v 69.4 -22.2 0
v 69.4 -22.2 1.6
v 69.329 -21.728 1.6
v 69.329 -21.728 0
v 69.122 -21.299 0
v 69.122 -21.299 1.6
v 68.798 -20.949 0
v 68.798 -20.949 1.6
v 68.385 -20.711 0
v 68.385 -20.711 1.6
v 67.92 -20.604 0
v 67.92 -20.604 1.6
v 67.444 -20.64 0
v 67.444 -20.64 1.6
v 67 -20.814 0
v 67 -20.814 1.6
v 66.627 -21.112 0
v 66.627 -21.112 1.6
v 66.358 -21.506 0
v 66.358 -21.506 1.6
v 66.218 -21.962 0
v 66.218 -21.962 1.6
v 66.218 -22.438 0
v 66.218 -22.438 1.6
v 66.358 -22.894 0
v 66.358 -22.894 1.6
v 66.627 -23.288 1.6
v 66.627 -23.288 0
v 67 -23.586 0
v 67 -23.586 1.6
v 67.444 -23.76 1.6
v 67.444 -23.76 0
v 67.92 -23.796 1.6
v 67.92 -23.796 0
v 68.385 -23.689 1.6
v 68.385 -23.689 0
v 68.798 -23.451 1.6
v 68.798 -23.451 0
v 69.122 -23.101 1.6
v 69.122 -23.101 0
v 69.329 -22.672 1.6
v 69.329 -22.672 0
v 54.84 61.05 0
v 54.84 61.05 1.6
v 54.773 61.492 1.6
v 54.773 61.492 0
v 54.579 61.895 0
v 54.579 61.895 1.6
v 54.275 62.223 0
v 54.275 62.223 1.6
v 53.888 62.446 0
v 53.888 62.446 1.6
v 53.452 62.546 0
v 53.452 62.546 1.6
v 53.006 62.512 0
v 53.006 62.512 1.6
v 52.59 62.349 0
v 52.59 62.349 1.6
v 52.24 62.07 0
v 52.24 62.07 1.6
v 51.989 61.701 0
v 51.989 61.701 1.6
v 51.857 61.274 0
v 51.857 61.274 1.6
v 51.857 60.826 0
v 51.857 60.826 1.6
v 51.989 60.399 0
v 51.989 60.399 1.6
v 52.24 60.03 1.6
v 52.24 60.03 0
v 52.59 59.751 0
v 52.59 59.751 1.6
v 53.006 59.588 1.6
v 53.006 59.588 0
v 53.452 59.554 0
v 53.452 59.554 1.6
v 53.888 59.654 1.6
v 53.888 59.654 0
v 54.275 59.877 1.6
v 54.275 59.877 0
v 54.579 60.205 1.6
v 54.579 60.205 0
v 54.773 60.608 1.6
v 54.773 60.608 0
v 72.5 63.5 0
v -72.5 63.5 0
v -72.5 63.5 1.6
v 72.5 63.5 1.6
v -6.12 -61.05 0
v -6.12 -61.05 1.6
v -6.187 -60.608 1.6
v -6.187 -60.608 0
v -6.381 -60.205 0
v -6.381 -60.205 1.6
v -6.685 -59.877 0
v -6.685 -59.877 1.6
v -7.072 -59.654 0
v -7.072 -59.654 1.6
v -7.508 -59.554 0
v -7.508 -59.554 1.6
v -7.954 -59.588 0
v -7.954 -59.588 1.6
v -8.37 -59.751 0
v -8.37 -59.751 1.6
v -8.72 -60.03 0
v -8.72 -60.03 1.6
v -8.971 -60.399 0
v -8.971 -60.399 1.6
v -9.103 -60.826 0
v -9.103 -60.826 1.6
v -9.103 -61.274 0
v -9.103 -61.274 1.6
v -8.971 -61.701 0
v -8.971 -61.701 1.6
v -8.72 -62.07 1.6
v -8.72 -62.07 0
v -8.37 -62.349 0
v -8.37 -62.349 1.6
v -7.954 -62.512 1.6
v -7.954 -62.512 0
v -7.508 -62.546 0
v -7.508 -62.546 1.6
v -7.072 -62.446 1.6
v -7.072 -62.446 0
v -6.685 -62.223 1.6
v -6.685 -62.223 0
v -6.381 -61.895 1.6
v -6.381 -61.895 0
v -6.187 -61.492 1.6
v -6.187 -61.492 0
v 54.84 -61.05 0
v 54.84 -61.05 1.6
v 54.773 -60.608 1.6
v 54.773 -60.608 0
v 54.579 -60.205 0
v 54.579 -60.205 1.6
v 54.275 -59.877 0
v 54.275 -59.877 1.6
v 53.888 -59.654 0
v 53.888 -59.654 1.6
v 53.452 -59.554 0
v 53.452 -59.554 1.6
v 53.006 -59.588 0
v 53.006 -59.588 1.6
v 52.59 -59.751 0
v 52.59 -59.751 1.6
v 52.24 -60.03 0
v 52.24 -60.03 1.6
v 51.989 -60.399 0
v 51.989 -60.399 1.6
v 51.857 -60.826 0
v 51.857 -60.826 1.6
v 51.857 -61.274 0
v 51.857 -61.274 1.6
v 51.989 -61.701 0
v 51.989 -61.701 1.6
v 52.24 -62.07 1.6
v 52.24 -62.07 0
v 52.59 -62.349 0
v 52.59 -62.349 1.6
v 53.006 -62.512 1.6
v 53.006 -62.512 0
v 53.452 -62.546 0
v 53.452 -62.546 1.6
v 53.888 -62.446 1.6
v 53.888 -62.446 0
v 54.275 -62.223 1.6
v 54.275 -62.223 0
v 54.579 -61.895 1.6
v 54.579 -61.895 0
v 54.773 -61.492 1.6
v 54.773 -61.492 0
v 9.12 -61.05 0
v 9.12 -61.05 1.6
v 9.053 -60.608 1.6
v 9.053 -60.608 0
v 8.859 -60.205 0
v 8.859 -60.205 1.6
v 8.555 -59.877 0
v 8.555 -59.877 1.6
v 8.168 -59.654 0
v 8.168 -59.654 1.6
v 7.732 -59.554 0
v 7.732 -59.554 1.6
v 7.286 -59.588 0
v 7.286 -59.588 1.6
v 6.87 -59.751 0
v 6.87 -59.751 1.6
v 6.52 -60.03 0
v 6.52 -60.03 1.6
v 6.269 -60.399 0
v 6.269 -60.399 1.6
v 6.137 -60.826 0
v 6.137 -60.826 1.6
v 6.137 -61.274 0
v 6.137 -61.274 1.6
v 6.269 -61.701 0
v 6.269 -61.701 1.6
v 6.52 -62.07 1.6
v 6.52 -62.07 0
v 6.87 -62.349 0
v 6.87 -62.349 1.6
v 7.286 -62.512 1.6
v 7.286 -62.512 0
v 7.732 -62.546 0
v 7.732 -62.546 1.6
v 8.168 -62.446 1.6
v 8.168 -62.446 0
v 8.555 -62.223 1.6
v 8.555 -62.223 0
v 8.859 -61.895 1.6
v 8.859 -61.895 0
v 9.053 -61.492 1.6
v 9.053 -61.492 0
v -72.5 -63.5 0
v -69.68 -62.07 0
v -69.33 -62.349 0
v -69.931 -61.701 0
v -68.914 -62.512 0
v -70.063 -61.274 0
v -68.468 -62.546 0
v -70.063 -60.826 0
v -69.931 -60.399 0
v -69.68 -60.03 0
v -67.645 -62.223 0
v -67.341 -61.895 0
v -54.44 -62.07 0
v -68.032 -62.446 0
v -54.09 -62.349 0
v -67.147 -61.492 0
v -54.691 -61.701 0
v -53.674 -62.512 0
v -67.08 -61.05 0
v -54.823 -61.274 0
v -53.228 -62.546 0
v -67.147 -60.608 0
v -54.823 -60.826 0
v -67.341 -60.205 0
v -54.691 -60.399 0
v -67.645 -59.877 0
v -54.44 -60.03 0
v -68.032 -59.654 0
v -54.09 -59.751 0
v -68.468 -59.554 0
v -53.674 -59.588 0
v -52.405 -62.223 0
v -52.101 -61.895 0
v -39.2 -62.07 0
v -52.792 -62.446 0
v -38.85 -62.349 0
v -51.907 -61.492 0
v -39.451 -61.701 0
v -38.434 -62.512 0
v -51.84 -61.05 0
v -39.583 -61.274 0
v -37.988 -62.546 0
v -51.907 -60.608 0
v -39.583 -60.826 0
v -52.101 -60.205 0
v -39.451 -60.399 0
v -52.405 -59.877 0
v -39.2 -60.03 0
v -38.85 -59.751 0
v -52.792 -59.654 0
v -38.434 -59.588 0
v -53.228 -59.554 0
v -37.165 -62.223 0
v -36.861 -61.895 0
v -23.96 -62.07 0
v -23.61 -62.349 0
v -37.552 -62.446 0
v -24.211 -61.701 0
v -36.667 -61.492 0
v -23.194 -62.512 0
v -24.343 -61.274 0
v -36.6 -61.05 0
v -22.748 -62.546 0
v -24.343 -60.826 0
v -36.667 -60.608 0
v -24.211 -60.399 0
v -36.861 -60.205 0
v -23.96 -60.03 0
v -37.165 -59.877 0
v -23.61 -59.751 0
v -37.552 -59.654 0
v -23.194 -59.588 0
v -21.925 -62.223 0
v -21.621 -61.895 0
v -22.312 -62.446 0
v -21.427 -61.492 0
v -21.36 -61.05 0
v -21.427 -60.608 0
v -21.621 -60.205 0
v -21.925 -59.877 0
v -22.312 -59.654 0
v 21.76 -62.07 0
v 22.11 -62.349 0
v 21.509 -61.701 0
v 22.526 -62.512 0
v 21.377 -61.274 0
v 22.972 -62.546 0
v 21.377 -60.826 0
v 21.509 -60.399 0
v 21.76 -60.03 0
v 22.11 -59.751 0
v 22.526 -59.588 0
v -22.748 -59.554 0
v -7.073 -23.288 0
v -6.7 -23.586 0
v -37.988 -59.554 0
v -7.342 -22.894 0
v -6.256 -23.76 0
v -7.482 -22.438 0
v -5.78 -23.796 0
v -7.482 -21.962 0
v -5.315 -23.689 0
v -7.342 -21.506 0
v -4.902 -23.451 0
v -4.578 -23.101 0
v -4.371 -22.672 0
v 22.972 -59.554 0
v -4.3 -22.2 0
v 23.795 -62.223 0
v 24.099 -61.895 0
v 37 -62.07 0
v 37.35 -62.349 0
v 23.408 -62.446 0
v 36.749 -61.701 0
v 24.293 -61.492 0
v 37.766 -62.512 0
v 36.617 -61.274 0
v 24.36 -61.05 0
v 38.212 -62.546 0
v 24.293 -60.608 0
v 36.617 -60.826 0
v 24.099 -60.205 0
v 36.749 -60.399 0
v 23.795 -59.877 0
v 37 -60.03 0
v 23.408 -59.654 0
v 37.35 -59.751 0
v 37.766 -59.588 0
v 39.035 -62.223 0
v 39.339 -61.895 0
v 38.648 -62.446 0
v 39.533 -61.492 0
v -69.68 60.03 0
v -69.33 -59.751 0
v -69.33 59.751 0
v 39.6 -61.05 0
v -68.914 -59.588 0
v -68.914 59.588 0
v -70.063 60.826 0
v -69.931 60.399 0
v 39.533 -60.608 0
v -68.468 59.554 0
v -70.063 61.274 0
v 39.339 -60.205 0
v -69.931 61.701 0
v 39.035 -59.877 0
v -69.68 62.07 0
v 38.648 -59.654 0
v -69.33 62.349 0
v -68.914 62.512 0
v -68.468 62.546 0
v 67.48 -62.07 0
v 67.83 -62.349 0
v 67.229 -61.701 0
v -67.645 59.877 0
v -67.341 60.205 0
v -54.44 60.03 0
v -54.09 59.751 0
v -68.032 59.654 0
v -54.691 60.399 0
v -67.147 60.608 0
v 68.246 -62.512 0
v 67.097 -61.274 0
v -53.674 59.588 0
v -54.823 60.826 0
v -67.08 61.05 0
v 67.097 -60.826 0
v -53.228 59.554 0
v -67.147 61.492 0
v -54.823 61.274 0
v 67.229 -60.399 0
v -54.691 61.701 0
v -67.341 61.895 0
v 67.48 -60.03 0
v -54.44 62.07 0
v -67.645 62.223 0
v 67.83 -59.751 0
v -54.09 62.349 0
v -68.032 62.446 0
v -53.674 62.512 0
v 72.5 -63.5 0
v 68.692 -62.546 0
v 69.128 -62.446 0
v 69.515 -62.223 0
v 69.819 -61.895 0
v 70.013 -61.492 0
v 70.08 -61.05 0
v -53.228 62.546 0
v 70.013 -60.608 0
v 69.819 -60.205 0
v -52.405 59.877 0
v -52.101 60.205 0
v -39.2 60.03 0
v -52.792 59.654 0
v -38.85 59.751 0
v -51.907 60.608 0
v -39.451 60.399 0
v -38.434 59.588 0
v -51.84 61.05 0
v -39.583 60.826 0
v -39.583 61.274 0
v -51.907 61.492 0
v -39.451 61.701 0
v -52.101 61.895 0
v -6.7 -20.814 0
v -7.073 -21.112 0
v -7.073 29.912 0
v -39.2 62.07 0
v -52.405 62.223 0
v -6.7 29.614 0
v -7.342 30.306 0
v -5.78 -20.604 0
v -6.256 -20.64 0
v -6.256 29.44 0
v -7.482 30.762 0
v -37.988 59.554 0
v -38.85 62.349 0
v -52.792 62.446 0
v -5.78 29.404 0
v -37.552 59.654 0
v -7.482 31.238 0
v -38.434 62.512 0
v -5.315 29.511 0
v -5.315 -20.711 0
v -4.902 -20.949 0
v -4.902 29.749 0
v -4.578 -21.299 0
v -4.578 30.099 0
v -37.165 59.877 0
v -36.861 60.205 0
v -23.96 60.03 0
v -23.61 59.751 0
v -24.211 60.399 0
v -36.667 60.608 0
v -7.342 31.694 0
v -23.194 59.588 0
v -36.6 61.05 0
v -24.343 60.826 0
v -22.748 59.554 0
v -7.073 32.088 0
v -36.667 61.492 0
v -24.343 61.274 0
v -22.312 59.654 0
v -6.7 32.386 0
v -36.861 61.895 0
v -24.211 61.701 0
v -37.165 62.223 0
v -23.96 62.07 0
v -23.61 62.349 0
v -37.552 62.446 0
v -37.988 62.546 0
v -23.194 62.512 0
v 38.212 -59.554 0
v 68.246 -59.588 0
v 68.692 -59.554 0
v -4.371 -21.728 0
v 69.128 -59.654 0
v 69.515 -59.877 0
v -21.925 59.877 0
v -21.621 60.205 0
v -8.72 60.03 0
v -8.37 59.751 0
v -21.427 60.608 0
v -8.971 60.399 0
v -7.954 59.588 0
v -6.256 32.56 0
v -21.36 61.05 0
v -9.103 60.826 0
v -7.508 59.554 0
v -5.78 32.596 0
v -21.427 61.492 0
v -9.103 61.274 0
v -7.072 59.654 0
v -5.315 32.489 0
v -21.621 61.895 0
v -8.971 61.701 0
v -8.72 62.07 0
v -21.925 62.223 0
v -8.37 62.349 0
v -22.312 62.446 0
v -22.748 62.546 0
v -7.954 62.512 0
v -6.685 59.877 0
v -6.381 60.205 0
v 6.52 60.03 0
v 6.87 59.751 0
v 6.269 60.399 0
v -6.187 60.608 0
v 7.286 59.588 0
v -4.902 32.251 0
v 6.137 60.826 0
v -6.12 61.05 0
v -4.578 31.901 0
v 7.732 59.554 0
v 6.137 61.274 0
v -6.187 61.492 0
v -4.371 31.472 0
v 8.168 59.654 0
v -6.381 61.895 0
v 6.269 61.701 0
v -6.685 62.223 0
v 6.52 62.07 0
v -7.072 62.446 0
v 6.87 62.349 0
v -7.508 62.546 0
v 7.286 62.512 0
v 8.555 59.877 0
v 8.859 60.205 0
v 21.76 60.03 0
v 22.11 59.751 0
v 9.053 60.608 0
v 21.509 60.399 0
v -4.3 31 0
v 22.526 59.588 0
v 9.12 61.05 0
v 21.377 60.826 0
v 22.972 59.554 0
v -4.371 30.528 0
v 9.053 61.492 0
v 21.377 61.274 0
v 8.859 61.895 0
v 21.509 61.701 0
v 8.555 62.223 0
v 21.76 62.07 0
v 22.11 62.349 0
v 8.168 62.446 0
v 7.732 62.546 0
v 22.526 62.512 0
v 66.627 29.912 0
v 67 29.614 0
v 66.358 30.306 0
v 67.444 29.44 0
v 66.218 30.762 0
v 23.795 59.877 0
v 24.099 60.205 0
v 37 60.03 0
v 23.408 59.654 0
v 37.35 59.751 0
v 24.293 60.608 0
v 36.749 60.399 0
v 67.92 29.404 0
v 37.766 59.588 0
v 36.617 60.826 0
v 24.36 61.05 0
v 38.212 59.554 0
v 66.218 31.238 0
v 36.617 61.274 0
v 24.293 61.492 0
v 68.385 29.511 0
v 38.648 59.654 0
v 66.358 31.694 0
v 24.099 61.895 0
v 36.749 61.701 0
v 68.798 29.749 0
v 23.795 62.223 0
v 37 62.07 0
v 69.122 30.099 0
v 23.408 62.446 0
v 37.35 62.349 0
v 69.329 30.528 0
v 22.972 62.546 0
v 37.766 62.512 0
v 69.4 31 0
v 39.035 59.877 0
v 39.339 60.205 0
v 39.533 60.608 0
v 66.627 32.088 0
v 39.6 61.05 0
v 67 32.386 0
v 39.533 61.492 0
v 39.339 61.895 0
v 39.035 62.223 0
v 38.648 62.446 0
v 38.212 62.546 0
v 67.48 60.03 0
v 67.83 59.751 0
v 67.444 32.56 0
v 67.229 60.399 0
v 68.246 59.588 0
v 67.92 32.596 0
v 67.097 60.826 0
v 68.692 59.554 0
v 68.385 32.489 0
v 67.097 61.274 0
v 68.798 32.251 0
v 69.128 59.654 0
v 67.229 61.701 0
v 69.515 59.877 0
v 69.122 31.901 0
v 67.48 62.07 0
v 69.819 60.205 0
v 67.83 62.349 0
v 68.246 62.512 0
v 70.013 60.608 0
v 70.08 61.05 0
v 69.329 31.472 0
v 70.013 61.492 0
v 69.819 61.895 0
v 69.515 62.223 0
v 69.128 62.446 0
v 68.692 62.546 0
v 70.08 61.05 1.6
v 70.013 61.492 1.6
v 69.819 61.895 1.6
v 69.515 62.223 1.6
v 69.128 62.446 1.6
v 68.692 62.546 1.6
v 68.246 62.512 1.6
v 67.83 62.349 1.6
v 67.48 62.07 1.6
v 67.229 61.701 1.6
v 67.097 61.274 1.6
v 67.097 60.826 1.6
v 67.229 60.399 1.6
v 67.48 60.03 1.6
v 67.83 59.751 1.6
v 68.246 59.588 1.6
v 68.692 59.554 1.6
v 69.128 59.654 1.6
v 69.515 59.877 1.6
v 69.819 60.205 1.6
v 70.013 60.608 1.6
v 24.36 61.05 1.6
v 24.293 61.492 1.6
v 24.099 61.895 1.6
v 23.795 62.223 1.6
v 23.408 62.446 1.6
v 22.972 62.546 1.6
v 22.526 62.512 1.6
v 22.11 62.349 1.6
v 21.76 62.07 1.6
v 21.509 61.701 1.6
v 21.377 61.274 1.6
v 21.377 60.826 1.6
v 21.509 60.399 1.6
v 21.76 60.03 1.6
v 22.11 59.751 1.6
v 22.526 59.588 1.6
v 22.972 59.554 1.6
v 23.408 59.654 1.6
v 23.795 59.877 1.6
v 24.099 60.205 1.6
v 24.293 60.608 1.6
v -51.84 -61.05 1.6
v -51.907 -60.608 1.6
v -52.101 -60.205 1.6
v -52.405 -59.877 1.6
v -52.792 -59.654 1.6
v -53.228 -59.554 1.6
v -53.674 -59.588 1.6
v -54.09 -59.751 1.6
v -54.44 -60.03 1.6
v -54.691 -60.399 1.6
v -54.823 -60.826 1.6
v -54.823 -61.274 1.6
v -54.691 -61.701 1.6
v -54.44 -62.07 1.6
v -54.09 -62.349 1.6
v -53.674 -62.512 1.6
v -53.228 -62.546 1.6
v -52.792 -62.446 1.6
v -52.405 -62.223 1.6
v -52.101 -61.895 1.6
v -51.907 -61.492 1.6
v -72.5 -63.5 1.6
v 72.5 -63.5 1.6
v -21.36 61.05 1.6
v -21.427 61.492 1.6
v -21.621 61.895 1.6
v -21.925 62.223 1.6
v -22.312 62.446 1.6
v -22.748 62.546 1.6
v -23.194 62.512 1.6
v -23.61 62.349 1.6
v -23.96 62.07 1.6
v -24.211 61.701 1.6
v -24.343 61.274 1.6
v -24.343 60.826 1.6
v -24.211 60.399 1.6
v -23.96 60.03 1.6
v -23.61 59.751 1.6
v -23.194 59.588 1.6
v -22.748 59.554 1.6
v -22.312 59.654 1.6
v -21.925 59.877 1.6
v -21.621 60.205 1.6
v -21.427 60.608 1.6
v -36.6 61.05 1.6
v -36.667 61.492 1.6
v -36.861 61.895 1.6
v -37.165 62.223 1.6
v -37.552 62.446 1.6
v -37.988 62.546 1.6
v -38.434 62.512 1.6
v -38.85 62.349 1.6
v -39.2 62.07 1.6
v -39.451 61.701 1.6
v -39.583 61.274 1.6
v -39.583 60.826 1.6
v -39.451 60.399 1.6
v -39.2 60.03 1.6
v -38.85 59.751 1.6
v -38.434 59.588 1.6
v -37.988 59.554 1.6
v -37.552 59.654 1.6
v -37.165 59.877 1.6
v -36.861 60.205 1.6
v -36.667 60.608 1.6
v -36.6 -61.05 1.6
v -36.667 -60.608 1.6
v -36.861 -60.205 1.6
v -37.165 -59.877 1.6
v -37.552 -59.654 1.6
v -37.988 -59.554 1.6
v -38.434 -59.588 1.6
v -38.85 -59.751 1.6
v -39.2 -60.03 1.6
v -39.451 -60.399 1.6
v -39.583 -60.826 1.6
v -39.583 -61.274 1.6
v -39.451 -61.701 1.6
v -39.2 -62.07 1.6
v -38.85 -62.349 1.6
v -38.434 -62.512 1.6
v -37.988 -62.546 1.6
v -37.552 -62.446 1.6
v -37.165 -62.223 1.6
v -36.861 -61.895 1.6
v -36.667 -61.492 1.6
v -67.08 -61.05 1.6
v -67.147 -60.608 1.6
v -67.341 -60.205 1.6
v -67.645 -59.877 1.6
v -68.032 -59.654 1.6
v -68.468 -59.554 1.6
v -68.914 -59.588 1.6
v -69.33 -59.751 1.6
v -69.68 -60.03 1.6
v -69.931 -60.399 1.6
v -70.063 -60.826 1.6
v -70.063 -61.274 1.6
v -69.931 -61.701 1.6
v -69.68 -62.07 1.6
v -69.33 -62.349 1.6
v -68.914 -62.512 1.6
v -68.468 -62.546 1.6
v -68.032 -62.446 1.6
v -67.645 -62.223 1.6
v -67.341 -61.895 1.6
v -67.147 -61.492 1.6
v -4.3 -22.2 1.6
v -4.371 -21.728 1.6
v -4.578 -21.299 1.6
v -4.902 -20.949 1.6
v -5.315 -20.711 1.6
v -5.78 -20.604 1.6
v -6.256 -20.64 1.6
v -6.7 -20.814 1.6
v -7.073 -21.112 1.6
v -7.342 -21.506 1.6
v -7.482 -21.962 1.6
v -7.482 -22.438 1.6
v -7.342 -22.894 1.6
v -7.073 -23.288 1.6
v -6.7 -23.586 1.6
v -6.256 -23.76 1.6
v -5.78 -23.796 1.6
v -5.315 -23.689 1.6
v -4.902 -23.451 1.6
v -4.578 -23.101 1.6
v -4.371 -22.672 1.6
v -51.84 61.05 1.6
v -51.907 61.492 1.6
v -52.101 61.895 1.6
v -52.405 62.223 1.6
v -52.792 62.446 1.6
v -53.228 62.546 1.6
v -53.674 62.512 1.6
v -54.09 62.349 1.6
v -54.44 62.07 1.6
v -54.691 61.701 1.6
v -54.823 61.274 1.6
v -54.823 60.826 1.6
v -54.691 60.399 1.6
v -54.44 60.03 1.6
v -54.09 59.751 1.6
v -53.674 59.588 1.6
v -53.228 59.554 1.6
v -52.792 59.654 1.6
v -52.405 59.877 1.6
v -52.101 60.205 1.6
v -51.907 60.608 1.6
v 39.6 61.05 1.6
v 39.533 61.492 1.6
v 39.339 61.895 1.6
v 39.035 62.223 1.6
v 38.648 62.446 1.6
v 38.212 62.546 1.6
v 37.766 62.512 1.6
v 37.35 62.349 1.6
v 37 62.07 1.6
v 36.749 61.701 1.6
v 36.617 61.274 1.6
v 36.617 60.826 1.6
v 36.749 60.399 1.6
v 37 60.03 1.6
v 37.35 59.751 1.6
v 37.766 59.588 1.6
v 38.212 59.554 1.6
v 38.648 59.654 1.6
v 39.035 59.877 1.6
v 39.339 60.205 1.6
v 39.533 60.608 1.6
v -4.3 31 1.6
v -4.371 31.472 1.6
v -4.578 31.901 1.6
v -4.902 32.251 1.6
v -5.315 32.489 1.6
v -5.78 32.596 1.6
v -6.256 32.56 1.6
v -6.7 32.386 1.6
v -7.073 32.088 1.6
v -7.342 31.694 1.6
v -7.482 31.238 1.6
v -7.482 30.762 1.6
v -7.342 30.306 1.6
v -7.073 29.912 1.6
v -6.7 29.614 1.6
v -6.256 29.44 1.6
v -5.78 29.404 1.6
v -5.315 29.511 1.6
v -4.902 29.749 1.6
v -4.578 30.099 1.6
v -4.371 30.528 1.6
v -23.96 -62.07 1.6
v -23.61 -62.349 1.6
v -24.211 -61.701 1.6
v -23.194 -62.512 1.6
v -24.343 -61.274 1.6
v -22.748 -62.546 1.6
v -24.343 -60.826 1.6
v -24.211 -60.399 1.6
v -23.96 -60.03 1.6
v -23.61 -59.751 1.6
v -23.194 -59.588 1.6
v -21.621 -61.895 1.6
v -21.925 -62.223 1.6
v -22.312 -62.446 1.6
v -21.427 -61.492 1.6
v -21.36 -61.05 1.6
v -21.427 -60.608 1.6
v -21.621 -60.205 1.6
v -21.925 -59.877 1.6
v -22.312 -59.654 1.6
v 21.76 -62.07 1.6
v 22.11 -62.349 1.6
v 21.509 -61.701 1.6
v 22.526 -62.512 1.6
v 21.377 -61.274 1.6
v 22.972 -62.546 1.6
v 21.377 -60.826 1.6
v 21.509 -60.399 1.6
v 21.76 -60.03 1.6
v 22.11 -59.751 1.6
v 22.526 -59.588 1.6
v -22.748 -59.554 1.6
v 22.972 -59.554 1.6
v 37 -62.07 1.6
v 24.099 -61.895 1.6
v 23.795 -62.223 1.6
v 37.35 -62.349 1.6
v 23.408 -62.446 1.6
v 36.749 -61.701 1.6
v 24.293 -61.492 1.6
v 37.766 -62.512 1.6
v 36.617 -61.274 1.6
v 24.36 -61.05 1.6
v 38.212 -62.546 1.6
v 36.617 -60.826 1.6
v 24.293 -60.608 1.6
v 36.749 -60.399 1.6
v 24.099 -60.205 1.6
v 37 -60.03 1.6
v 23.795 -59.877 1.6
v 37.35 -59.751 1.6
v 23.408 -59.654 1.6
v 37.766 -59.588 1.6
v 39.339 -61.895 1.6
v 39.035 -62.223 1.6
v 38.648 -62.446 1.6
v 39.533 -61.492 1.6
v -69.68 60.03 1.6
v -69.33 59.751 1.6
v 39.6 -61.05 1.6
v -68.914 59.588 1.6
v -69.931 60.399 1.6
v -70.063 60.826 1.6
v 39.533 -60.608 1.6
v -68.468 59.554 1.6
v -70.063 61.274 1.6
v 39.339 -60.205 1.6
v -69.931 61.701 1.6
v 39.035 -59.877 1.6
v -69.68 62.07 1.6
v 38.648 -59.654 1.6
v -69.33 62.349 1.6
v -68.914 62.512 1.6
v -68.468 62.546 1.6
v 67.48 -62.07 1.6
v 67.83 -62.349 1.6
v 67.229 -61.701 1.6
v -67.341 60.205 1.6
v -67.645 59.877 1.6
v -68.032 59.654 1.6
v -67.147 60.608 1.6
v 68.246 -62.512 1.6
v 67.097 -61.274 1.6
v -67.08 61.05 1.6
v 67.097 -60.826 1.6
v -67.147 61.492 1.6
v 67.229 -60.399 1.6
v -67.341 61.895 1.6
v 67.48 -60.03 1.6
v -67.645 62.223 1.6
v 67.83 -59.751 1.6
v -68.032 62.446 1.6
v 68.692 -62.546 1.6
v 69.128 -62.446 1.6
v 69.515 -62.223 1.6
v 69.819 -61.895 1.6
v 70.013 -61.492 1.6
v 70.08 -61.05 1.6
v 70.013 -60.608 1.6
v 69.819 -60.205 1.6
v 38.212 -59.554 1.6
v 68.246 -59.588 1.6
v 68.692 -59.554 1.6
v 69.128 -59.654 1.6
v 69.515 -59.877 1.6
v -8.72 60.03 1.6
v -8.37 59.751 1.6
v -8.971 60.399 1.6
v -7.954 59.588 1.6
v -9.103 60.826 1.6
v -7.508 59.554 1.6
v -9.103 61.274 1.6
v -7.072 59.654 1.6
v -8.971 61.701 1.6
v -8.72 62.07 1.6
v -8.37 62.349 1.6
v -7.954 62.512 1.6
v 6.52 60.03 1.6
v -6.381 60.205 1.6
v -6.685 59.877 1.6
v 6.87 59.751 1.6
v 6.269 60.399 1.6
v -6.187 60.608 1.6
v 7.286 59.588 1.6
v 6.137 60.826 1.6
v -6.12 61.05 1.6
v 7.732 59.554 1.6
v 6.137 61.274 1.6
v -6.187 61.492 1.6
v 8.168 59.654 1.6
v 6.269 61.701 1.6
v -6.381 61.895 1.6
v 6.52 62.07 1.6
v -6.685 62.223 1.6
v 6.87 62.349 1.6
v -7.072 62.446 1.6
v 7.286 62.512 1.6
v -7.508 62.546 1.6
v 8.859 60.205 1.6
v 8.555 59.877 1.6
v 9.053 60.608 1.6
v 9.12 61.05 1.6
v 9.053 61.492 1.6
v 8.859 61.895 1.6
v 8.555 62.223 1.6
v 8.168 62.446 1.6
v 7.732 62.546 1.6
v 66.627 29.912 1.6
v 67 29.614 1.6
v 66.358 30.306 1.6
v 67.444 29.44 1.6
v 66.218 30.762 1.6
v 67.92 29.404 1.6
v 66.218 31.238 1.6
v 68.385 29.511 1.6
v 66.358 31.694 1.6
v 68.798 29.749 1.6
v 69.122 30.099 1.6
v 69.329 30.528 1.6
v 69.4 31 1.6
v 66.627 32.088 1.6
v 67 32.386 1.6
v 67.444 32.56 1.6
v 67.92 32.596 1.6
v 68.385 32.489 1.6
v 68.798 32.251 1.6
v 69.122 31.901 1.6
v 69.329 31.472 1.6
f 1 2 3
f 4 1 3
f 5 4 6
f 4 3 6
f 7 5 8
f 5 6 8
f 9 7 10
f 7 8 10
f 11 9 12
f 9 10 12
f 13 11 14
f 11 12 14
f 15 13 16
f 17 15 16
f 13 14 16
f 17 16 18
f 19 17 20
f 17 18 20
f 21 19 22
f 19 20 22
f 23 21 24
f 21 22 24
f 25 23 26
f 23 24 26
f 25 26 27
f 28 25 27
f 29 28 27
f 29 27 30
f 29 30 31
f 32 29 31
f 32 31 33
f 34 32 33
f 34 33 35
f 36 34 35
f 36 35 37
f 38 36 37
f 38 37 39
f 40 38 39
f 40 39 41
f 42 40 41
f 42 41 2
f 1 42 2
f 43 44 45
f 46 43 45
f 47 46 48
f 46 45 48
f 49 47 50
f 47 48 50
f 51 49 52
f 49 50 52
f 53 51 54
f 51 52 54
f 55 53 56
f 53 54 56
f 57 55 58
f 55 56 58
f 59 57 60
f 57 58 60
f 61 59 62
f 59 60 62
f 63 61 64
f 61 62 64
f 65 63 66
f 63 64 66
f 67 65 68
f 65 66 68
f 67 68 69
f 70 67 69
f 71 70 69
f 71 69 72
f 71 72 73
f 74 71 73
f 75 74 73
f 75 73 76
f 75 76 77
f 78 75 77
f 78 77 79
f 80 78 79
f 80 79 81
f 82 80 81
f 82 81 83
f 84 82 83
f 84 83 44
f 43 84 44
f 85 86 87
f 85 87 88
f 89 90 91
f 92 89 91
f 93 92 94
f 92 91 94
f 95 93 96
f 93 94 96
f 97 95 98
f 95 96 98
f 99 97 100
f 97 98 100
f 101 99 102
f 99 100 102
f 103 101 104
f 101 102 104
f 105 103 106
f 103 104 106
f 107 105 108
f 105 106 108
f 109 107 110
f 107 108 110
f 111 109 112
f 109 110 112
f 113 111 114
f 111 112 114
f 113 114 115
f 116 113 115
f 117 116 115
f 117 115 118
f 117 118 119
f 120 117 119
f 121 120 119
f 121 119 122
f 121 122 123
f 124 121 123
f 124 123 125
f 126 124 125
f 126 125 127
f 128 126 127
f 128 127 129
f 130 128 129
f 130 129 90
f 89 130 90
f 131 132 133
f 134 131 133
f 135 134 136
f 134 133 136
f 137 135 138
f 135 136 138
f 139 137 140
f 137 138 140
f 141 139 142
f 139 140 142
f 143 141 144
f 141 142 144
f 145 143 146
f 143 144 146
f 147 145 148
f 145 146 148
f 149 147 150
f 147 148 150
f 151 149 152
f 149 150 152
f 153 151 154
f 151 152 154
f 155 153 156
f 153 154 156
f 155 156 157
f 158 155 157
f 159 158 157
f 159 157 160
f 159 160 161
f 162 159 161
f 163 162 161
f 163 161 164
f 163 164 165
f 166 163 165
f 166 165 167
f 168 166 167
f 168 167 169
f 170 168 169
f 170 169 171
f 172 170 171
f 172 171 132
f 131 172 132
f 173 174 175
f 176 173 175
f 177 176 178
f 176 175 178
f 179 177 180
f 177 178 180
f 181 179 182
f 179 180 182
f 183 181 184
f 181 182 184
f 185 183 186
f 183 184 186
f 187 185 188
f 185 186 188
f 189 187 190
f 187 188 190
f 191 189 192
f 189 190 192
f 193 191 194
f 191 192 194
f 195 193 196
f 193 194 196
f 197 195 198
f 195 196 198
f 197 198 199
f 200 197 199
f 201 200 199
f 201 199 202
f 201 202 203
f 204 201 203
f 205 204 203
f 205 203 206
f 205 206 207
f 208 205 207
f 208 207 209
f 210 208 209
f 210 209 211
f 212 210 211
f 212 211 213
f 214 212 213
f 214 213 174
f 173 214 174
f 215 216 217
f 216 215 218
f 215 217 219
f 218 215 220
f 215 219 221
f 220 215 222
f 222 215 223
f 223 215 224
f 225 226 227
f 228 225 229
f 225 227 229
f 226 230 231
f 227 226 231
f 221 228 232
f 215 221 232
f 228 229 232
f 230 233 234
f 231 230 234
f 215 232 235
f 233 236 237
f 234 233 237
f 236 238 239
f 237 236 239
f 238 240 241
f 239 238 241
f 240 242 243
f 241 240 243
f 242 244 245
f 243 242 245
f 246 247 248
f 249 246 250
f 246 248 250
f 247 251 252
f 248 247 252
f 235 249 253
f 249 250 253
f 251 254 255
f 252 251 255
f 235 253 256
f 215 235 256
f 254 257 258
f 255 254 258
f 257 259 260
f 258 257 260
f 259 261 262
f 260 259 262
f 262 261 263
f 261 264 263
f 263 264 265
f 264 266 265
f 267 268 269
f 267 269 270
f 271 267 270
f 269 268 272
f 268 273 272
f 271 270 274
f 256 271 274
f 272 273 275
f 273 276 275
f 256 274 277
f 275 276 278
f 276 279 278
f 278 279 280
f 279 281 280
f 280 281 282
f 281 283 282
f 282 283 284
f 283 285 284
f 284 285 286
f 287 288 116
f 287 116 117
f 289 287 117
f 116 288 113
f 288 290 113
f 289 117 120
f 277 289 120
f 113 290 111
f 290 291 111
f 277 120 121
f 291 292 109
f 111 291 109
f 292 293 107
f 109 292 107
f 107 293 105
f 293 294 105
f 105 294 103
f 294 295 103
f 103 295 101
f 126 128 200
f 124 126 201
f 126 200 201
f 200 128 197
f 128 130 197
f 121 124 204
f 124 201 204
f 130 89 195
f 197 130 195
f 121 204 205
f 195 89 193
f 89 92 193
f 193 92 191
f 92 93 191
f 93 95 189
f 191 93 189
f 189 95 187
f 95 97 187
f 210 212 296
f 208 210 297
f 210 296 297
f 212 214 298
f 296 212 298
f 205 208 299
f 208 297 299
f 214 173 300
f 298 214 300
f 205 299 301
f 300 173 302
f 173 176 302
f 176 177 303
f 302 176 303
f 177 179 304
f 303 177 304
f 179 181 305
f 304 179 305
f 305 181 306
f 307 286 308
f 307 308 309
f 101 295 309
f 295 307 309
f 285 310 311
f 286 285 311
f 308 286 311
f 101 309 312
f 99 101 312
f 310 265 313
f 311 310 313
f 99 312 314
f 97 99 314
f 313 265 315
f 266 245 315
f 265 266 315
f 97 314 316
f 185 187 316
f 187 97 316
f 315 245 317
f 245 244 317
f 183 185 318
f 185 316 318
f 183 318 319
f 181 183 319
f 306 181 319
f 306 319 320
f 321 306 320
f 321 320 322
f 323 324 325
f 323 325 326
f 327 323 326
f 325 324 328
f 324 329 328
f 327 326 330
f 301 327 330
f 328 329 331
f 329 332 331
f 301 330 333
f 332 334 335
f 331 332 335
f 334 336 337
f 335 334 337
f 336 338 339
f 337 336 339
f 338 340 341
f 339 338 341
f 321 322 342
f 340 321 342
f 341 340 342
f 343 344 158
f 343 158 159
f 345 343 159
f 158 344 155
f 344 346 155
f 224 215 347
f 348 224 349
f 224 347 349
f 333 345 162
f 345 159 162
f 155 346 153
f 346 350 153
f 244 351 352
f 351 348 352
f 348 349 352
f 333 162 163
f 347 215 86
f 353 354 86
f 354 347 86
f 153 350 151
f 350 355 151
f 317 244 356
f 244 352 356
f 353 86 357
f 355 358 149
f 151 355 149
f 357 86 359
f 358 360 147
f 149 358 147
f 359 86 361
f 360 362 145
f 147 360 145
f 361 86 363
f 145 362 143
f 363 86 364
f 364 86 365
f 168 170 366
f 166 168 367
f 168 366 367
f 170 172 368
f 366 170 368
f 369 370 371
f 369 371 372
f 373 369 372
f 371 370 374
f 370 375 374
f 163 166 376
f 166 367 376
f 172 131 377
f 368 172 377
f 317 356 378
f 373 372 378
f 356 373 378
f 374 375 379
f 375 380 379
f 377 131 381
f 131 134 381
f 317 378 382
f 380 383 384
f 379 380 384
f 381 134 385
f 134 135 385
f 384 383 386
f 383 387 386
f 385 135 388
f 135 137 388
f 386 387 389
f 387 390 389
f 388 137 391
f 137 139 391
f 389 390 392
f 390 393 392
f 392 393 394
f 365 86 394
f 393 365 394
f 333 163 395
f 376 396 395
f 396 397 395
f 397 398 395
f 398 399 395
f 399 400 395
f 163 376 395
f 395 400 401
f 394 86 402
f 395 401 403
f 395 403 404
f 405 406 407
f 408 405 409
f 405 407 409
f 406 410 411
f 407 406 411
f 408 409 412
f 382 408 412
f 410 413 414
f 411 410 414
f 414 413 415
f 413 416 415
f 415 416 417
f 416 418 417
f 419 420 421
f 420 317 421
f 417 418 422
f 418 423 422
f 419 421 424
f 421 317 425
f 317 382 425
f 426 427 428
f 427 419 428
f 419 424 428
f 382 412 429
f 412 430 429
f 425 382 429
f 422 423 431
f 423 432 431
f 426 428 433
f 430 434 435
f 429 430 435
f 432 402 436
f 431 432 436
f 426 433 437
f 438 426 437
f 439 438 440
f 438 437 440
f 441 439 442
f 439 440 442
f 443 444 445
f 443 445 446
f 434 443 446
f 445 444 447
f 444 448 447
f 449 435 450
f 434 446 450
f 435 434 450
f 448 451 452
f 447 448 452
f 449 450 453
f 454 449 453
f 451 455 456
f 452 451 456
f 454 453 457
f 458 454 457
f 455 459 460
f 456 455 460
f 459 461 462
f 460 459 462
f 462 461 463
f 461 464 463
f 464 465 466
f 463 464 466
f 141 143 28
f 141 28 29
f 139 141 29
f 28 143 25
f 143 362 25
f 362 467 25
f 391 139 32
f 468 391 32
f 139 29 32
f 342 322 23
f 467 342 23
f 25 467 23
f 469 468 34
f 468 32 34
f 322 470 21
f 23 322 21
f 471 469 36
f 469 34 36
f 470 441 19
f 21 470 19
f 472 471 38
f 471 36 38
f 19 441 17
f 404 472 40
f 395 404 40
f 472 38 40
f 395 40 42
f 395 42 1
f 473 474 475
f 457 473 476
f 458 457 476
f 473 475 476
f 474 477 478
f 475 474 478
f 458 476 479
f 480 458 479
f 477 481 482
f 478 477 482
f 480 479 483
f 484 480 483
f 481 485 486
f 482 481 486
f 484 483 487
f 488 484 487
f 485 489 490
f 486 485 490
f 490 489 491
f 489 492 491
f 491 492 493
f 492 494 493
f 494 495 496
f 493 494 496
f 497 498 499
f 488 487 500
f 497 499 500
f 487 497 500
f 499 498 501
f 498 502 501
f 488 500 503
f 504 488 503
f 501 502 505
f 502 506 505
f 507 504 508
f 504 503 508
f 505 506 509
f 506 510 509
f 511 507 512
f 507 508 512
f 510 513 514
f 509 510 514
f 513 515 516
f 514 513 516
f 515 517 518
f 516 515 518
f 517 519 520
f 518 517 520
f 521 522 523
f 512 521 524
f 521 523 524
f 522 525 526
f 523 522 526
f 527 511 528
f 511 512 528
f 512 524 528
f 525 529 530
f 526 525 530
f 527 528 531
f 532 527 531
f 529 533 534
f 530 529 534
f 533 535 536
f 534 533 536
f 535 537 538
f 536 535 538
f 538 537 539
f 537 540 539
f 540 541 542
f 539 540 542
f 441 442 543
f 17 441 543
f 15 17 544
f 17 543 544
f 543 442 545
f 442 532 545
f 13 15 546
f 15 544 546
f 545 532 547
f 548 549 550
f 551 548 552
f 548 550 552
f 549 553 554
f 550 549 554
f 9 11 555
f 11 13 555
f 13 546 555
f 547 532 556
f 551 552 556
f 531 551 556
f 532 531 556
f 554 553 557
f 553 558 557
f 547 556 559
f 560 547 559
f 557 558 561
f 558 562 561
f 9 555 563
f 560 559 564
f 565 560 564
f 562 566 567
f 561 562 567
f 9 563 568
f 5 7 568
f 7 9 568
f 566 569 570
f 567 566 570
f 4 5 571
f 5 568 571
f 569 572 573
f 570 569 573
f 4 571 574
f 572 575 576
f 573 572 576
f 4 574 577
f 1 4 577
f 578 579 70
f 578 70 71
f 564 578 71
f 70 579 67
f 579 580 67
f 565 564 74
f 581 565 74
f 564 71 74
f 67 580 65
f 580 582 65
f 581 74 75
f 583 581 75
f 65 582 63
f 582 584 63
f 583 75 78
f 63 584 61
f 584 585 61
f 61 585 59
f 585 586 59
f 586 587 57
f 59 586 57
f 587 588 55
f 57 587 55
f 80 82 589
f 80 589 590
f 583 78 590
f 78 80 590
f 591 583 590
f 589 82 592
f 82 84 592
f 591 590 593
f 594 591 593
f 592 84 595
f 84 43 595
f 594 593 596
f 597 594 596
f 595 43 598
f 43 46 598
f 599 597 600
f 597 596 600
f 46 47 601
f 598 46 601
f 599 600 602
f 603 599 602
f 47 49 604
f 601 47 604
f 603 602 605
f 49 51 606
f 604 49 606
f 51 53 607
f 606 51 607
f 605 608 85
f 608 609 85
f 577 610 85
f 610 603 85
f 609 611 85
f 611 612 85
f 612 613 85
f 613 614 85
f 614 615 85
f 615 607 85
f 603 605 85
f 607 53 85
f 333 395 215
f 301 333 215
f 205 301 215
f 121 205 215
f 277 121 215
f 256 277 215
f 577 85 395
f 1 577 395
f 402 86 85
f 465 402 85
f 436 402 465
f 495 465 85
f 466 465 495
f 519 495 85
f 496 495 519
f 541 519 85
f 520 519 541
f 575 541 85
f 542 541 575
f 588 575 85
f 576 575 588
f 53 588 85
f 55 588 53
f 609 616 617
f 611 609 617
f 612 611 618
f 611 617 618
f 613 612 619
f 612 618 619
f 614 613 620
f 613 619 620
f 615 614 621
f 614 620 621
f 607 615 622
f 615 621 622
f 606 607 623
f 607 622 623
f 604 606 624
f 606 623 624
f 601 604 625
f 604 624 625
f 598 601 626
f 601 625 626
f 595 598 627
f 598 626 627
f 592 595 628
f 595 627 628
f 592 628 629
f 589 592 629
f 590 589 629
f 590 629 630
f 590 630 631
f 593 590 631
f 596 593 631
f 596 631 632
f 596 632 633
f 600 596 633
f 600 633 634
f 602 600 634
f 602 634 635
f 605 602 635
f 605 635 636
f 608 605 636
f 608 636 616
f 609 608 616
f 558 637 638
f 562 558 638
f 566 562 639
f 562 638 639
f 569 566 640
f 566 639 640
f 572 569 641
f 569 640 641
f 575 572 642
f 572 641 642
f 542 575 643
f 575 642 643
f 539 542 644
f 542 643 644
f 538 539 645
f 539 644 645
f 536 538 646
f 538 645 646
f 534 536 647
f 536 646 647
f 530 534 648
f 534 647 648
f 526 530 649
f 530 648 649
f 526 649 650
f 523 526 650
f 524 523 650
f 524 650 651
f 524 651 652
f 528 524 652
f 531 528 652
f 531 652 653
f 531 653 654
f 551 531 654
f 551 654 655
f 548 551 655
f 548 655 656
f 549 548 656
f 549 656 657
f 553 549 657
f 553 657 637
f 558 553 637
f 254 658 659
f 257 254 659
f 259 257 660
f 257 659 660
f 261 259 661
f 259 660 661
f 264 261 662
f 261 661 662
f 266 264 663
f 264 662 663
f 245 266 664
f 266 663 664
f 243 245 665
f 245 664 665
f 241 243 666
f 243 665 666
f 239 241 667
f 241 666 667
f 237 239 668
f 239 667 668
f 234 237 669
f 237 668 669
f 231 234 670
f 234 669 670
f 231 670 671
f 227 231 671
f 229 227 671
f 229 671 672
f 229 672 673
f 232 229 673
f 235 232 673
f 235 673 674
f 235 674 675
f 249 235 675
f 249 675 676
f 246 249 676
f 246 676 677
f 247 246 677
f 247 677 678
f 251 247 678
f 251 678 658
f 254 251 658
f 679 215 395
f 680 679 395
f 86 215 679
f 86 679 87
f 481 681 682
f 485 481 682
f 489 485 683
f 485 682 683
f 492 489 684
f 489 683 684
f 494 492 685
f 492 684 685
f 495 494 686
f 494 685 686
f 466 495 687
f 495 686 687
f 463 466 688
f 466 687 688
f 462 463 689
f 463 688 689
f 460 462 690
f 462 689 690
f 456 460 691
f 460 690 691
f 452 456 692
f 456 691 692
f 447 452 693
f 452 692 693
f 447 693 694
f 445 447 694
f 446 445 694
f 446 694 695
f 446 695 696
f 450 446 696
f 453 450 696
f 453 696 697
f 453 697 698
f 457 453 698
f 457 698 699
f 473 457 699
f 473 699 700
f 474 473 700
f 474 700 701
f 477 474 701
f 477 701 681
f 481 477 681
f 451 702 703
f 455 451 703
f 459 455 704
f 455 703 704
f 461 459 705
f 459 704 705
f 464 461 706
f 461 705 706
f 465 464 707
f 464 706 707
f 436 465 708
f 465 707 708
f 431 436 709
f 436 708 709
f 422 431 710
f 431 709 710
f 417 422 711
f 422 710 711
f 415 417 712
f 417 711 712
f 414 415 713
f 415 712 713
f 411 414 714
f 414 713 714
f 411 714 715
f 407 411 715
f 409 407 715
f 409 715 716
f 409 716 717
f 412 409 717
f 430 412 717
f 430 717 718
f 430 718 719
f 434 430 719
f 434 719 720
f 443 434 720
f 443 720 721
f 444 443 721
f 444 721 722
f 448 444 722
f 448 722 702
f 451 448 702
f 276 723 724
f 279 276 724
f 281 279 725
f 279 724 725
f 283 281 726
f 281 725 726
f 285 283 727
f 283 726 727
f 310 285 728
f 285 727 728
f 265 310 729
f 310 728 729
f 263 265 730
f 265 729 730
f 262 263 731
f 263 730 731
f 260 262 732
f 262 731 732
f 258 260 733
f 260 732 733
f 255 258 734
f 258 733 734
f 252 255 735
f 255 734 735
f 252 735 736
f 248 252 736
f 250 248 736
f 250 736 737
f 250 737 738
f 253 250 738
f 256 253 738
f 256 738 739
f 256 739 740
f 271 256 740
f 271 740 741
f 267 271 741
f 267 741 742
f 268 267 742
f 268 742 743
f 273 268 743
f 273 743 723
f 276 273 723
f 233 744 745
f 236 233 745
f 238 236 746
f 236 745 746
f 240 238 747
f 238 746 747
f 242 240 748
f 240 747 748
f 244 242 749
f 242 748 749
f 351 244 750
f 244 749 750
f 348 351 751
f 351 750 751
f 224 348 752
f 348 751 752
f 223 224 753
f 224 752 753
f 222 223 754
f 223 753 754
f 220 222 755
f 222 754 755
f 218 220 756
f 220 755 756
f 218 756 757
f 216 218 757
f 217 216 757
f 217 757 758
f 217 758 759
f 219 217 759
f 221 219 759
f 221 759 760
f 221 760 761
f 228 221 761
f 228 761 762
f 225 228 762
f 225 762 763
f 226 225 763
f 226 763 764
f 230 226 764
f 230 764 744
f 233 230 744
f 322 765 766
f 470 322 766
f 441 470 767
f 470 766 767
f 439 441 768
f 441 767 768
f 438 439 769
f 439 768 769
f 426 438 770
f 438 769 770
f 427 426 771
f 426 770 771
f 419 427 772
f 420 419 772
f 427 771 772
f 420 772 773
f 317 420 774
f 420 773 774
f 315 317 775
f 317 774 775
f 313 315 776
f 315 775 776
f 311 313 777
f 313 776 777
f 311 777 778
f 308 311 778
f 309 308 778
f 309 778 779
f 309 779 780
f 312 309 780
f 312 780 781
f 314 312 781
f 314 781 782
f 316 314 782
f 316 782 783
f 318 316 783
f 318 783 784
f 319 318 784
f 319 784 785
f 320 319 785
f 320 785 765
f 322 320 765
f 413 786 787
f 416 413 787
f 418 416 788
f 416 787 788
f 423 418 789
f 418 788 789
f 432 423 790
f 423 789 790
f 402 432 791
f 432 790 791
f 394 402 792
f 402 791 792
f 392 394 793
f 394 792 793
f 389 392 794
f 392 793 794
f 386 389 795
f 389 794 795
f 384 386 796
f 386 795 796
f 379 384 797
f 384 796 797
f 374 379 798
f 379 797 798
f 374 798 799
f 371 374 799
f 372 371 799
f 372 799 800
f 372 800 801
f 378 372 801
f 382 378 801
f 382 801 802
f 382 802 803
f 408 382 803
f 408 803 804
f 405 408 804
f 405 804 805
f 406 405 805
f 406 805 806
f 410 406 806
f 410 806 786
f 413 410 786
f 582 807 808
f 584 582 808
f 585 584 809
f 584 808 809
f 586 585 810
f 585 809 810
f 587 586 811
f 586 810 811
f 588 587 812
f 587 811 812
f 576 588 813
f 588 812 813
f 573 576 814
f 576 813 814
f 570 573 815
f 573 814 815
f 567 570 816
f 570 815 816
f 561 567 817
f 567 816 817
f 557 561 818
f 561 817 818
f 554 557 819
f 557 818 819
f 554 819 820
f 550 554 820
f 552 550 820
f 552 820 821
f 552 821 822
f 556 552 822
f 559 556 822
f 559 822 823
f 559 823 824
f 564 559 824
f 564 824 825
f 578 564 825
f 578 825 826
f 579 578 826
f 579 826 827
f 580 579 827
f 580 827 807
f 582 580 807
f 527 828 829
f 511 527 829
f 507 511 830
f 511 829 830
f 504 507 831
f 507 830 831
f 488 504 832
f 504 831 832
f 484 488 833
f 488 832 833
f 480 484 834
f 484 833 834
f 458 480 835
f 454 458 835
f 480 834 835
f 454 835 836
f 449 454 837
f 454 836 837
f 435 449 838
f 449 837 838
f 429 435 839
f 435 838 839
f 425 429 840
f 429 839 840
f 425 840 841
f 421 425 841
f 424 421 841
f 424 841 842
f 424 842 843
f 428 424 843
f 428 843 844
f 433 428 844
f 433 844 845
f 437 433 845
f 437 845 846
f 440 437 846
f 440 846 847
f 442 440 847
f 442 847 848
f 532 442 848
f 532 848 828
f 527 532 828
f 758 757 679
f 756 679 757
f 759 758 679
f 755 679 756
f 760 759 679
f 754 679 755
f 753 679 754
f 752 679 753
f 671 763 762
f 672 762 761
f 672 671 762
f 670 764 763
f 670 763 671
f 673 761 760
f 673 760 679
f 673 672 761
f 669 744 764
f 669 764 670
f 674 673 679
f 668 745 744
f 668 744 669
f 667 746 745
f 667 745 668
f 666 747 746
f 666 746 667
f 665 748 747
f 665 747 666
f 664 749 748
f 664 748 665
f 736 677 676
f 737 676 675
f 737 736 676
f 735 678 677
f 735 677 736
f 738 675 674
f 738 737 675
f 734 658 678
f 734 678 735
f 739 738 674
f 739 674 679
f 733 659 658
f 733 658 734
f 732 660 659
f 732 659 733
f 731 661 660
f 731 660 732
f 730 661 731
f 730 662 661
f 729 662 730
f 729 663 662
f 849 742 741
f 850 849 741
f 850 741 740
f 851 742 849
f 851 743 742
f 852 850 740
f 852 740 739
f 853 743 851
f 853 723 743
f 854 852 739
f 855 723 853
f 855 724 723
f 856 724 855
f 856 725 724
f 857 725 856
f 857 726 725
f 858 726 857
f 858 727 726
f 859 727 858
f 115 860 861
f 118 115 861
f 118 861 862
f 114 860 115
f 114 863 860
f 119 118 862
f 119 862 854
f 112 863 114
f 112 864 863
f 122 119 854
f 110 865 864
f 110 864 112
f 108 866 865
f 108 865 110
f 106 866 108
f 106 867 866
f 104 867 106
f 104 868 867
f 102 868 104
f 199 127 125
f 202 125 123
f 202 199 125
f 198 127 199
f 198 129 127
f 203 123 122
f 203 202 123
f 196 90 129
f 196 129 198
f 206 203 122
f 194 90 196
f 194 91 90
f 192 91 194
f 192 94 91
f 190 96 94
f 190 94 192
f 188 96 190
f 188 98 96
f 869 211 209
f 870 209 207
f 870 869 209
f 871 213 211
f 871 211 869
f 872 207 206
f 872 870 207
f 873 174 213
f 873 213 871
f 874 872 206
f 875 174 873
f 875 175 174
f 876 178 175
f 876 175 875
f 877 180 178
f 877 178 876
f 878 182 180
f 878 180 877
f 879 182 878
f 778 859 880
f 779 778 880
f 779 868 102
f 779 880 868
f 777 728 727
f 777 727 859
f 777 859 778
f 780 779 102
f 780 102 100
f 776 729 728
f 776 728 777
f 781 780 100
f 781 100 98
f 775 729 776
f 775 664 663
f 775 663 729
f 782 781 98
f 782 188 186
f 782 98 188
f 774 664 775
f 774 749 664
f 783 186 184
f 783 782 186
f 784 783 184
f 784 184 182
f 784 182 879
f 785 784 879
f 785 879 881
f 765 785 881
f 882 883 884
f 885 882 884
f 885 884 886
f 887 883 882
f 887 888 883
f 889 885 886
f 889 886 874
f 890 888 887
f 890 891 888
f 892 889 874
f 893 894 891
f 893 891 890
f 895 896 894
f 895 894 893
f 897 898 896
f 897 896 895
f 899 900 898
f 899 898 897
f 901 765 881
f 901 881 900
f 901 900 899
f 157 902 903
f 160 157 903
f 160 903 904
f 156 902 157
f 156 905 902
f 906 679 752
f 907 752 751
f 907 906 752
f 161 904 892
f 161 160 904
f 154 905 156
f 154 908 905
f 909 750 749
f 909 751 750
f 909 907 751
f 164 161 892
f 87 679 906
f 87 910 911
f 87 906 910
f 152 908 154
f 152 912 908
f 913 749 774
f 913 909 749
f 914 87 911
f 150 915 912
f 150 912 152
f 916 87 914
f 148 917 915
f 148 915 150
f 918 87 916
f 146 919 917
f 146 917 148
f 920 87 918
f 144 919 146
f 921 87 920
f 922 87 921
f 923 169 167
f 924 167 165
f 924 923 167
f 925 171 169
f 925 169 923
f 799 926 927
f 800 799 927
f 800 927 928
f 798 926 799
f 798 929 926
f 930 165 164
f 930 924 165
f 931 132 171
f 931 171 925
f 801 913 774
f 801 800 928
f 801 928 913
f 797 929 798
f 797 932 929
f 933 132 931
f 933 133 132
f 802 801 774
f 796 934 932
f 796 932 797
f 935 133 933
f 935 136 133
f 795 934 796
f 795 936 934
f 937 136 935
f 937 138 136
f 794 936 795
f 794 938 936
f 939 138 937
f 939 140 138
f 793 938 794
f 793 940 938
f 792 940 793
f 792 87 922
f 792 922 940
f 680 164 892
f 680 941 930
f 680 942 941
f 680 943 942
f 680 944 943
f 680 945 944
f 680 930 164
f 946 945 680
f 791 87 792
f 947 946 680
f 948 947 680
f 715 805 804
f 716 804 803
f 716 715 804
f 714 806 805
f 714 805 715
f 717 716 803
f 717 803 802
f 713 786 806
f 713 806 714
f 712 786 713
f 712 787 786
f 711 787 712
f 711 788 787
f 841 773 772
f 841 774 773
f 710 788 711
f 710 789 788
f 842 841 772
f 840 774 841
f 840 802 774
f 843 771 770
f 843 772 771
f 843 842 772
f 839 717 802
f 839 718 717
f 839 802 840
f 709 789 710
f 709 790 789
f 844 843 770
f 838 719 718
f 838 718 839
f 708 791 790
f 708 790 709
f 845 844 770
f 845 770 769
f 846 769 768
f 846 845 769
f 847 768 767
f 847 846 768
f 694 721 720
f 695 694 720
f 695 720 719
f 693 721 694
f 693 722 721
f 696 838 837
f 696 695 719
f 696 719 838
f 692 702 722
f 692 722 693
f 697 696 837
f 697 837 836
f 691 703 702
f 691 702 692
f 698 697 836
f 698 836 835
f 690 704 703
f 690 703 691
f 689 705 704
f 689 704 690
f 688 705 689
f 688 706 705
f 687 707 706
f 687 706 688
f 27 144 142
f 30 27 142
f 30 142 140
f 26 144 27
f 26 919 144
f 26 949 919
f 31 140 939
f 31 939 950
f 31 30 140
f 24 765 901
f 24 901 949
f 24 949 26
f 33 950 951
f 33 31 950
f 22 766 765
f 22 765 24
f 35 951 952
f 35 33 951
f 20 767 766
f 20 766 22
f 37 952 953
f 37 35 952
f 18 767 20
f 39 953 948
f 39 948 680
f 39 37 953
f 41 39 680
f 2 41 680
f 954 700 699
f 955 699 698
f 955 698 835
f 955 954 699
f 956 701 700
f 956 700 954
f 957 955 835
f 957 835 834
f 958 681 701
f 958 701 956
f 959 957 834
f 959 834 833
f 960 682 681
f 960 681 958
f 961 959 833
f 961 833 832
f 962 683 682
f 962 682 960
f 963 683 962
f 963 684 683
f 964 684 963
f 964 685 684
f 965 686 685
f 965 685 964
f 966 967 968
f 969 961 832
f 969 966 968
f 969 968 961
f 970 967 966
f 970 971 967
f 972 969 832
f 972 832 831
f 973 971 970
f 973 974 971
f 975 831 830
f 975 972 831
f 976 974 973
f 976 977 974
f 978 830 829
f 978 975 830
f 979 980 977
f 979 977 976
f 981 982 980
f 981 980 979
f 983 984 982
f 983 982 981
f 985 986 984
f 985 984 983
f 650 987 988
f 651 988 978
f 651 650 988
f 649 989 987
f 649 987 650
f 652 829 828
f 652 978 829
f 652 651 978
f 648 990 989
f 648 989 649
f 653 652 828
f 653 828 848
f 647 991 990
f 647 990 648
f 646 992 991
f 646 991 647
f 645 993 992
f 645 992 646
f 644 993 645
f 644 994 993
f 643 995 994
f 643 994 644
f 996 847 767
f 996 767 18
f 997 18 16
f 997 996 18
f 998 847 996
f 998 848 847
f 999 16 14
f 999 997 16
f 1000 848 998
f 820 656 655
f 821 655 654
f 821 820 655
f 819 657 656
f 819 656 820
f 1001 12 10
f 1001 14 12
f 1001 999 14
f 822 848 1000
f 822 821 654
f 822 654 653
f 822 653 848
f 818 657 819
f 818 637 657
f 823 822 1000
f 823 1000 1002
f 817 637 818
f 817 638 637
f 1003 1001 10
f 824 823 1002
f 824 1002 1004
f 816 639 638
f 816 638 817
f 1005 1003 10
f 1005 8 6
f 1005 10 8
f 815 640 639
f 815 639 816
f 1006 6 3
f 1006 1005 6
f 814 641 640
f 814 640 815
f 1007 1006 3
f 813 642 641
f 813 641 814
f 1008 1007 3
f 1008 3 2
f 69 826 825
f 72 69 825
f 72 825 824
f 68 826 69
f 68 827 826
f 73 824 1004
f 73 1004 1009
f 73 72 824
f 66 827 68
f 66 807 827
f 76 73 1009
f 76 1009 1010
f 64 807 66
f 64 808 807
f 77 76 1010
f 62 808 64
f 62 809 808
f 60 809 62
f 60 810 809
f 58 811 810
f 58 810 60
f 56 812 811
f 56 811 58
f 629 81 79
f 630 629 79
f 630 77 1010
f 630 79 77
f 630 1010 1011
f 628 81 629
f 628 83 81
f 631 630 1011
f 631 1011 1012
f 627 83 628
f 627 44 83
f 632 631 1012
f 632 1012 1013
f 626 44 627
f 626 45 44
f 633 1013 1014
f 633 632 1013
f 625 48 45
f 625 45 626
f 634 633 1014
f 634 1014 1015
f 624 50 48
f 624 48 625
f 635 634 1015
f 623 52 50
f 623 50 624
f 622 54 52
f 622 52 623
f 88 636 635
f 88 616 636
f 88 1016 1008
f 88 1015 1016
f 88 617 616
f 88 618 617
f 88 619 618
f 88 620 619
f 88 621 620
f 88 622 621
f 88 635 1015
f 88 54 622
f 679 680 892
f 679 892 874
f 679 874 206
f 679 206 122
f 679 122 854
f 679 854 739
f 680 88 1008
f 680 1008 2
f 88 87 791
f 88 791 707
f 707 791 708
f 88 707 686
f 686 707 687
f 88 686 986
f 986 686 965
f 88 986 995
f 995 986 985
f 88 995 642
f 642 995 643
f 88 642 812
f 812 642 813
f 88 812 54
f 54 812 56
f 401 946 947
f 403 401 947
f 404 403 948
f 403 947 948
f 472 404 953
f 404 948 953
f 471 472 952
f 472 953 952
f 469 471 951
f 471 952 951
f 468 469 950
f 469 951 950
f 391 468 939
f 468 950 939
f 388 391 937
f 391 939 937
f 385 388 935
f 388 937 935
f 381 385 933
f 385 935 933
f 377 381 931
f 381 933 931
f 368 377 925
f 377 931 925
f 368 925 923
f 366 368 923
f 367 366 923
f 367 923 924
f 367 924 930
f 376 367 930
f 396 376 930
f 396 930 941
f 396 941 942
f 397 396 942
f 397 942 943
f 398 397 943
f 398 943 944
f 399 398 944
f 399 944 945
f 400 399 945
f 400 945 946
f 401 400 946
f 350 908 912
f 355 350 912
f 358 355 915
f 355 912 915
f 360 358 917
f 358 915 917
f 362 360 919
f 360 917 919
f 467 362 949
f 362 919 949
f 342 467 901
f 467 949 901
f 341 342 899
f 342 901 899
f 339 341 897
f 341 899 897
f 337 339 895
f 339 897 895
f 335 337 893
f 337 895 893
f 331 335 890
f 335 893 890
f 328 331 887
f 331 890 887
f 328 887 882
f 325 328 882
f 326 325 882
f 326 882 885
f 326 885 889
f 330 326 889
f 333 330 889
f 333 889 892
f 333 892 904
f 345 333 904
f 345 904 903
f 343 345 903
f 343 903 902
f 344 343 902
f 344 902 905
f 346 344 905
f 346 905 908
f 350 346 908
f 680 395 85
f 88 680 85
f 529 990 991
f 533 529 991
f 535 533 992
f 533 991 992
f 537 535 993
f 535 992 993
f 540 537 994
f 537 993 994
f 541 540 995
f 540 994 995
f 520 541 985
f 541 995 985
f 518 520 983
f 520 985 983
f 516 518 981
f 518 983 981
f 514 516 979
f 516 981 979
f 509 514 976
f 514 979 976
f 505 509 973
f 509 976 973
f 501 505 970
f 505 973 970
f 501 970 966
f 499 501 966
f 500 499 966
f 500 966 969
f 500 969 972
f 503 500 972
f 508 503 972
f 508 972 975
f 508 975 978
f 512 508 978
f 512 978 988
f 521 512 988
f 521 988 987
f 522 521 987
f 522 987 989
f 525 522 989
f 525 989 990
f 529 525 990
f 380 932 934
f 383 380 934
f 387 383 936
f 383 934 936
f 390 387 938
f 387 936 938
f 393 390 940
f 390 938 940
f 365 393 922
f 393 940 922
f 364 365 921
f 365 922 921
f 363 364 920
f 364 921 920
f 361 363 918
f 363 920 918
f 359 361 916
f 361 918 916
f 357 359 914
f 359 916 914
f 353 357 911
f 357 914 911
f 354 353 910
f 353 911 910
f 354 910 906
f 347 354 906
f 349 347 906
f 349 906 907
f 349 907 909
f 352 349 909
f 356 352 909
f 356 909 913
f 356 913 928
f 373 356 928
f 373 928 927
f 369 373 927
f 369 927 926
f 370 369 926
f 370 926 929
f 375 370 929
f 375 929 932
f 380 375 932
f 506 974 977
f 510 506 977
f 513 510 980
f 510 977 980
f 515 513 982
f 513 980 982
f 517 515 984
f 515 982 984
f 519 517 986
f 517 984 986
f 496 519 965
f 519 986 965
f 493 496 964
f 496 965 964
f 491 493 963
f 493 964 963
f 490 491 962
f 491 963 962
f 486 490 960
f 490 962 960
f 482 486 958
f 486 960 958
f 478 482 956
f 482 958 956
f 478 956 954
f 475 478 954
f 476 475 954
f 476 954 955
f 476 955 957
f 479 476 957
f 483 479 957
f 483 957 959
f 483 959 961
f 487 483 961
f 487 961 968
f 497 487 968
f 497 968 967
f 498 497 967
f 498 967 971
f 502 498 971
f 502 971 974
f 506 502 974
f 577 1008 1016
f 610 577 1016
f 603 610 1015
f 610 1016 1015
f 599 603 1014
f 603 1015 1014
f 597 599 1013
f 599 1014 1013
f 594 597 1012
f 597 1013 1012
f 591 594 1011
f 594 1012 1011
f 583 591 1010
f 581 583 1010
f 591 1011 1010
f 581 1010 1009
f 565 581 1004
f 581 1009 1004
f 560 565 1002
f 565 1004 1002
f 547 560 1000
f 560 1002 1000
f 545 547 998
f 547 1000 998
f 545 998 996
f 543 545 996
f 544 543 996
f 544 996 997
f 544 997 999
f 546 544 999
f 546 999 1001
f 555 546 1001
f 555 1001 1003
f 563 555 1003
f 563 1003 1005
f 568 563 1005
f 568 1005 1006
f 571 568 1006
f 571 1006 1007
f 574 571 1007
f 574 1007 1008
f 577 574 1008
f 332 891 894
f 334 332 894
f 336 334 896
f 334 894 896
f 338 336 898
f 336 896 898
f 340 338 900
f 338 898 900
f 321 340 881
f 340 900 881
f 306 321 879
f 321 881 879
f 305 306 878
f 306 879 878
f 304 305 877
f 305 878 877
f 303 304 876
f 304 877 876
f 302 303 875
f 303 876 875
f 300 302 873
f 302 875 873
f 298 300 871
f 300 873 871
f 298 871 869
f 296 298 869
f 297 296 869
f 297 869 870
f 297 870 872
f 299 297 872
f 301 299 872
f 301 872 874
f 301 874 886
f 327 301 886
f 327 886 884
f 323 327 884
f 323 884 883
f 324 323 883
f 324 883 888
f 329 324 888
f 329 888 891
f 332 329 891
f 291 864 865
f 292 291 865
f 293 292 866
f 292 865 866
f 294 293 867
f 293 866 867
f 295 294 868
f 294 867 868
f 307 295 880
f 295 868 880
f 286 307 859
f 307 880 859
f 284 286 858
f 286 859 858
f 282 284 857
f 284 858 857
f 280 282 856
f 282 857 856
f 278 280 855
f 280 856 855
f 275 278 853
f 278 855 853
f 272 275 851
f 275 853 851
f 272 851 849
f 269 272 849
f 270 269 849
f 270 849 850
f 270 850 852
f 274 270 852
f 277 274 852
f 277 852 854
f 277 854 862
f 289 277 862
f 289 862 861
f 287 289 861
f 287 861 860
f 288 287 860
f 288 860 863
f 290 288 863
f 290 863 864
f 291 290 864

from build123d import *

# Parameters (mm, degrees)
ESQUISSE1_W                   = 145
ESQUISSE1_H                   = 127
BOSS_EXTRU_1_DEPTH            = 1.6
DIAM_TRE_DU_PER_AGE_3_0_3_1_D = 3
ENL_V_MAT_EXTRU_1_REACH       = 98.39
ESQUISSE4_R                   = 1.6


with BuildPart() as part:
    # Esquisse1 → Boss.-Extru.1 (new body)
    with BuildSketch(Plane.XY):
        Rectangle(ESQUISSE1_W, ESQUISSE1_H)
    extrude(amount=BOSS_EXTRU_1_DEPTH)

    # Diamètre du perçage Ø3.0 (3)1 (through all)
    with Locations(Plane(origin=(0, 0, 0), x_dir=(-1, 0, 0), z_dir=(0, 0, -1))):
        with Locations((-68.58, 61.04999644), (-38.1, 61.04999644), (-7.62, 61.04999644), (22.86, 61.04999644), (53.34, 61.04999644), (68.58, 61.04999644), (-68.58, -61.05000356), (-53.34, -61.05000356), (-38.1, -61.05000356), (-22.86, -61.05000356), (-7.62, -61.05000356), (7.62, -61.05000356), (22.86, -61.05000356), (38.1, -61.05000356), (53.34, -61.05000356), (68.58, -61.05000356), (38.1, 61.04999644), (7.62, 61.04999644), (-22.86, 61.04999644), (-53.34, 61.04999644)):
            Hole(DIAM_TRE_DU_PER_AGE_3_0_3_1_D / 2)

    # Esquisse4 → Enlèv. mat.-Extru.1 (cut, up to next)
    with BuildSketch(Plane.XY.offset(1.6), mode=Mode.PRIVATE) as enl_v_mat_extru_1_sk1:
        with Locations((67.8, -22.2)):
            Circle(ESQUISSE4_R)
    enl_v_mat_extru_1_tool1 = extrude(enl_v_mat_extru_1_sk1.sketch, amount=-ENL_V_MAT_EXTRU_1_REACH, mode=Mode.PRIVATE) & part.part
    # Esquisse4 → Enlèv. mat.-Extru.1 (cut, up to next)
    with BuildSketch(Plane.XY.offset(1.6), mode=Mode.PRIVATE) as enl_v_mat_extru_1_sk2:
        with Locations((-5.9, -22.2)):
            Circle(ESQUISSE4_R)
    enl_v_mat_extru_1_tool2 = extrude(enl_v_mat_extru_1_sk2.sketch, amount=-ENL_V_MAT_EXTRU_1_REACH, mode=Mode.PRIVATE) & part.part
    # Esquisse4 → Enlèv. mat.-Extru.1 (cut, up to next)
    with BuildSketch(Plane.XY.offset(1.6), mode=Mode.PRIVATE) as enl_v_mat_extru_1_sk3:
        with Locations((-5.9, 31)):
            Circle(ESQUISSE4_R)
    enl_v_mat_extru_1_tool3 = extrude(enl_v_mat_extru_1_sk3.sketch, amount=-ENL_V_MAT_EXTRU_1_REACH, mode=Mode.PRIVATE) & part.part
    # Esquisse4 → Enlèv. mat.-Extru.1 (cut, up to next)
    with BuildSketch(Plane.XY.offset(1.6), mode=Mode.PRIVATE) as enl_v_mat_extru_1_sk4:
        with Locations((67.8, 31)):
            Circle(ESQUISSE4_R)
    enl_v_mat_extru_1_tool4 = extrude(enl_v_mat_extru_1_sk4.sketch, amount=-ENL_V_MAT_EXTRU_1_REACH, mode=Mode.PRIVATE) & part.part
    add(enl_v_mat_extru_1_tool1.solids().sort_by_distance((67.8, -22.2, 1.6))[0], mode=Mode.SUBTRACT)
    add(enl_v_mat_extru_1_tool2.solids().sort_by_distance((-5.9, -22.2, 1.6))[0], mode=Mode.SUBTRACT)
    add(enl_v_mat_extru_1_tool3.solids().sort_by_distance((-5.9, 31, 1.6))[0], mode=Mode.SUBTRACT)
    add(enl_v_mat_extru_1_tool4.solids().sort_by_distance((67.8, 31, 1.6))[0], mode=Mode.SUBTRACT)


solid = part.part
